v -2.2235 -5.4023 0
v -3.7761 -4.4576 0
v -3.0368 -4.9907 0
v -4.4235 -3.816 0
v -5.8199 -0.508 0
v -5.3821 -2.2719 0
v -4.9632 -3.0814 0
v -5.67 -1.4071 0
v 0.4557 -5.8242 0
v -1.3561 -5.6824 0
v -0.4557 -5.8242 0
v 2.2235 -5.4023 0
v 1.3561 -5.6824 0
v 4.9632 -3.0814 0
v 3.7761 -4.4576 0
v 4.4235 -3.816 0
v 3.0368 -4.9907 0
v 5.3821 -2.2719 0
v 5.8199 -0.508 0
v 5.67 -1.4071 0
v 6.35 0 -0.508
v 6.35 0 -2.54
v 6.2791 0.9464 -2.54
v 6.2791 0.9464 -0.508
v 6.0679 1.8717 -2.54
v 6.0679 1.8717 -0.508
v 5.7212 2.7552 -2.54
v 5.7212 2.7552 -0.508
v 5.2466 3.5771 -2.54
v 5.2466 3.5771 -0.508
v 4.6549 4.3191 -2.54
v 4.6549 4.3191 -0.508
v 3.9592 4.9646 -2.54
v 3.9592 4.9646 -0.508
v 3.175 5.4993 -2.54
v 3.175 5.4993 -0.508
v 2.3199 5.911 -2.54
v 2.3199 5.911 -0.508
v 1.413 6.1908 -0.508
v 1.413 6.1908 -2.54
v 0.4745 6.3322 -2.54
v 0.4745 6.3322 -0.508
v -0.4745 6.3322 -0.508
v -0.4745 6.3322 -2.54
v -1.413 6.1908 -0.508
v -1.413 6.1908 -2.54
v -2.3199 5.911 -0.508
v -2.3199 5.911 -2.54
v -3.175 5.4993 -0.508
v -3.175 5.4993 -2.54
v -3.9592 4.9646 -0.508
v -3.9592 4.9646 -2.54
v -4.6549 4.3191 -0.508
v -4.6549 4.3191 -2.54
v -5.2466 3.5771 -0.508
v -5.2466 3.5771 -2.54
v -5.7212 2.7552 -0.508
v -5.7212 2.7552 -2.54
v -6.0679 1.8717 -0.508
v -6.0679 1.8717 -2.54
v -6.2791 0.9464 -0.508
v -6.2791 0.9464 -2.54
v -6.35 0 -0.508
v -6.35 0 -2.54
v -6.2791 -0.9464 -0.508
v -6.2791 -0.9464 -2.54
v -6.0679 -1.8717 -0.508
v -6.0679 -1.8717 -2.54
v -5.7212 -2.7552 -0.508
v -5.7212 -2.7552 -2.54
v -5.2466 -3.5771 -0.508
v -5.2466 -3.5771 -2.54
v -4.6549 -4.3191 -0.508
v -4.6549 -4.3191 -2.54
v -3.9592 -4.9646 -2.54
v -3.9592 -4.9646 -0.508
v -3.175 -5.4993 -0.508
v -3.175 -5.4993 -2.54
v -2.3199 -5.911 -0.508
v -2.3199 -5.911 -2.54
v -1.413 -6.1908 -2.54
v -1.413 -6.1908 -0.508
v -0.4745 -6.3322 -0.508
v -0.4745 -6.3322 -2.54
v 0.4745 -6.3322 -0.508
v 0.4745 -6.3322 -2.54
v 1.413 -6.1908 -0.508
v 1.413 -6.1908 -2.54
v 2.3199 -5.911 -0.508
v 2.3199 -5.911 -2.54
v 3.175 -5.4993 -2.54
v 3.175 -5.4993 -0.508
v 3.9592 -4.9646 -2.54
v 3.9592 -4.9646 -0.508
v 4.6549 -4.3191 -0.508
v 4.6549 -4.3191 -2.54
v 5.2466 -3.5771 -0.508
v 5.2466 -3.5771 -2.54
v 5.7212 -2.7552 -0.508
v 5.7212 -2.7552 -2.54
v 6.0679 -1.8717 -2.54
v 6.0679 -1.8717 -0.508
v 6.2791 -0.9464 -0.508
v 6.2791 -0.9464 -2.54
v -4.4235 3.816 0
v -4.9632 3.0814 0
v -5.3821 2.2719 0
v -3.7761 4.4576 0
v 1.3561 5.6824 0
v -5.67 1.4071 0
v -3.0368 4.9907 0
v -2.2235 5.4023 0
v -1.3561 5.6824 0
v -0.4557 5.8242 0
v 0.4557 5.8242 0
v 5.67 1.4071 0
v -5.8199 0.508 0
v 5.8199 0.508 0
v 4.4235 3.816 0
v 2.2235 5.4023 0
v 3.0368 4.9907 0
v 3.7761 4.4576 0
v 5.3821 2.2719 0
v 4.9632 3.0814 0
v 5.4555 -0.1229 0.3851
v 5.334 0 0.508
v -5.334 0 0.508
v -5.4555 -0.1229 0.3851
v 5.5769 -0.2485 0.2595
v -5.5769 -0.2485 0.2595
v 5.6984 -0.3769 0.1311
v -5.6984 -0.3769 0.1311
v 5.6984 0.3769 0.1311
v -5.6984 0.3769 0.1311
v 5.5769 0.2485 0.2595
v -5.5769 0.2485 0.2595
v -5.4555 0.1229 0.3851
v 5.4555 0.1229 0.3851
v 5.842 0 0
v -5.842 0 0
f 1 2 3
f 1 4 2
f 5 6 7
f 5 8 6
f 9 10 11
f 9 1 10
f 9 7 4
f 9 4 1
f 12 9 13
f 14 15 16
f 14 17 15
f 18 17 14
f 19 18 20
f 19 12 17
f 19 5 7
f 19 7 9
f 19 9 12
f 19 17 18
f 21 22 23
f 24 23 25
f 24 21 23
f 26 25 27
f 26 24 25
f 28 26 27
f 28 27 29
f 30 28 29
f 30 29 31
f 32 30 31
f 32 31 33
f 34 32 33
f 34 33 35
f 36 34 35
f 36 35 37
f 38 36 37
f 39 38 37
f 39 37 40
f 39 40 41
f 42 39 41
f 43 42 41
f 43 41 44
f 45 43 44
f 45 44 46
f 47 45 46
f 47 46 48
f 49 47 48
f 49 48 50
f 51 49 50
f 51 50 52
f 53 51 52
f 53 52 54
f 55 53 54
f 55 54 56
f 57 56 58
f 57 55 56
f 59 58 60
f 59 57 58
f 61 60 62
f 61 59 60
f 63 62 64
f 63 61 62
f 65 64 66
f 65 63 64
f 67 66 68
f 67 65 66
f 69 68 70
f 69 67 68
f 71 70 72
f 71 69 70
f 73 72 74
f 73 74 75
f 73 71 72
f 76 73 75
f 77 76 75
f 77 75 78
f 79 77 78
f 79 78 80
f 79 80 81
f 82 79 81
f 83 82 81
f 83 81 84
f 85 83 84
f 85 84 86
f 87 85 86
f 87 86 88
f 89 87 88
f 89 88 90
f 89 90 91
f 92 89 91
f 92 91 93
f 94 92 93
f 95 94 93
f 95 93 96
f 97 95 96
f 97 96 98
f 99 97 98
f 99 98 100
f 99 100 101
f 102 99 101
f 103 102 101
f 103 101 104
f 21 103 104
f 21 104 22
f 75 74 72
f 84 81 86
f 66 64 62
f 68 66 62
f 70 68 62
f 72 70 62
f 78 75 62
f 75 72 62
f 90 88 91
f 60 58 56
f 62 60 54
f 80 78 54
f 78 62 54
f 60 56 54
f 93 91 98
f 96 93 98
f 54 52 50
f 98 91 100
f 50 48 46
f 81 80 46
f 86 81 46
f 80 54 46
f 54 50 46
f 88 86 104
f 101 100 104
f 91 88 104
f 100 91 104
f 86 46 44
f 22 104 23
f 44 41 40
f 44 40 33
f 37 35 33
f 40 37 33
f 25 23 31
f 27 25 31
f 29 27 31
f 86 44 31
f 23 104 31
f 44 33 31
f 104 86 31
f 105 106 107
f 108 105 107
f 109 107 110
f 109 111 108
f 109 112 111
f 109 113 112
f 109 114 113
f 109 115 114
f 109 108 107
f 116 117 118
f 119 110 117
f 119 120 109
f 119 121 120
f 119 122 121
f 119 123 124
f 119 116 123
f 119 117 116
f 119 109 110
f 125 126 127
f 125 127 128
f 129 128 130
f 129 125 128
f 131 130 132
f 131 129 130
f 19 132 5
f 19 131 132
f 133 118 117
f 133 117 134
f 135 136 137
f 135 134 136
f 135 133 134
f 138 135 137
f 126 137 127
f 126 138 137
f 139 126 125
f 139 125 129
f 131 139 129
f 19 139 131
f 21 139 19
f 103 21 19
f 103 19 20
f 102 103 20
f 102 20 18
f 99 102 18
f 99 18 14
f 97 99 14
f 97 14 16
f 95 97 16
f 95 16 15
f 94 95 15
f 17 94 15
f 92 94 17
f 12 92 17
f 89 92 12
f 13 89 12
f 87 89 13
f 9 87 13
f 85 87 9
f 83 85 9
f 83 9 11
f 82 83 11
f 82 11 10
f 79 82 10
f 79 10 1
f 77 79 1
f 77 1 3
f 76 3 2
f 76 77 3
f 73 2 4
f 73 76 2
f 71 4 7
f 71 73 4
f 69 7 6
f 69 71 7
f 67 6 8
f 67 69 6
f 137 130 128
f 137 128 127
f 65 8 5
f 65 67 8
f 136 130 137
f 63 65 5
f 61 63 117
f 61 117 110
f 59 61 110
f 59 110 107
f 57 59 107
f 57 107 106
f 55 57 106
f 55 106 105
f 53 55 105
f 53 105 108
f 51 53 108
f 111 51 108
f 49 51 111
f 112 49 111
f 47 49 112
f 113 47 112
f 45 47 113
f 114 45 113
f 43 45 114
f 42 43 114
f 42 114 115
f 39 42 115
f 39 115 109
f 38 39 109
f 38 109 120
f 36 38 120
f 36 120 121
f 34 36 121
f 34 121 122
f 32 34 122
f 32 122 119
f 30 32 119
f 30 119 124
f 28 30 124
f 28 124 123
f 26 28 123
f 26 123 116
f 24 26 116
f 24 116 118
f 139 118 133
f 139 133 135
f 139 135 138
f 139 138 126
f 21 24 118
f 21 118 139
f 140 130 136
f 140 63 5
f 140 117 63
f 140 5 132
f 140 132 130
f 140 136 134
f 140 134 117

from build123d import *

# Parameters (mm, degrees)
F3_DEPTH = 6.35
F0_R     = 6.35
F4_DEPTH = 2.54
F5_R     = 12.7
F5_R_2   = 6.35
F6_DEPTH = 6.35


with BuildPart() as f3:
    # F2 (on Right) → F3 (new body, symmetric)
    with BuildSketch(Plane.YZ):
        Polygon((0, -0.508), (0.508, 0), (0, 0.508), (-0.508, 0), align=None)
    extrude(amount=F3_DEPTH, both=True)

    # F0 (on Top) → F4 (join)
    with BuildSketch(Plane.XY):
        Circle(F0_R)
    extrude(amount=-F4_DEPTH)

    # F5 (on face) → F6 (cut, symmetric)
    with BuildSketch(Plane.XY):
        Circle(F5_R)
        Circle(F5_R_2, mode=Mode.SUBTRACT)
    extrude(amount=F6_DEPTH, both=True, mode=Mode.SUBTRACT)

    # F7 (on Front) → F8 (revolve, cut)
    with BuildSketch(Plane.XZ):
        Polygon((6.35, 0.508), (5.334, 0.508), (6.35, -0.508), align=None)
    revolve(axis=Axis((0, 0, -0.254), (0, 0, -1)), mode=Mode.SUBTRACT)


solid = f3.part
